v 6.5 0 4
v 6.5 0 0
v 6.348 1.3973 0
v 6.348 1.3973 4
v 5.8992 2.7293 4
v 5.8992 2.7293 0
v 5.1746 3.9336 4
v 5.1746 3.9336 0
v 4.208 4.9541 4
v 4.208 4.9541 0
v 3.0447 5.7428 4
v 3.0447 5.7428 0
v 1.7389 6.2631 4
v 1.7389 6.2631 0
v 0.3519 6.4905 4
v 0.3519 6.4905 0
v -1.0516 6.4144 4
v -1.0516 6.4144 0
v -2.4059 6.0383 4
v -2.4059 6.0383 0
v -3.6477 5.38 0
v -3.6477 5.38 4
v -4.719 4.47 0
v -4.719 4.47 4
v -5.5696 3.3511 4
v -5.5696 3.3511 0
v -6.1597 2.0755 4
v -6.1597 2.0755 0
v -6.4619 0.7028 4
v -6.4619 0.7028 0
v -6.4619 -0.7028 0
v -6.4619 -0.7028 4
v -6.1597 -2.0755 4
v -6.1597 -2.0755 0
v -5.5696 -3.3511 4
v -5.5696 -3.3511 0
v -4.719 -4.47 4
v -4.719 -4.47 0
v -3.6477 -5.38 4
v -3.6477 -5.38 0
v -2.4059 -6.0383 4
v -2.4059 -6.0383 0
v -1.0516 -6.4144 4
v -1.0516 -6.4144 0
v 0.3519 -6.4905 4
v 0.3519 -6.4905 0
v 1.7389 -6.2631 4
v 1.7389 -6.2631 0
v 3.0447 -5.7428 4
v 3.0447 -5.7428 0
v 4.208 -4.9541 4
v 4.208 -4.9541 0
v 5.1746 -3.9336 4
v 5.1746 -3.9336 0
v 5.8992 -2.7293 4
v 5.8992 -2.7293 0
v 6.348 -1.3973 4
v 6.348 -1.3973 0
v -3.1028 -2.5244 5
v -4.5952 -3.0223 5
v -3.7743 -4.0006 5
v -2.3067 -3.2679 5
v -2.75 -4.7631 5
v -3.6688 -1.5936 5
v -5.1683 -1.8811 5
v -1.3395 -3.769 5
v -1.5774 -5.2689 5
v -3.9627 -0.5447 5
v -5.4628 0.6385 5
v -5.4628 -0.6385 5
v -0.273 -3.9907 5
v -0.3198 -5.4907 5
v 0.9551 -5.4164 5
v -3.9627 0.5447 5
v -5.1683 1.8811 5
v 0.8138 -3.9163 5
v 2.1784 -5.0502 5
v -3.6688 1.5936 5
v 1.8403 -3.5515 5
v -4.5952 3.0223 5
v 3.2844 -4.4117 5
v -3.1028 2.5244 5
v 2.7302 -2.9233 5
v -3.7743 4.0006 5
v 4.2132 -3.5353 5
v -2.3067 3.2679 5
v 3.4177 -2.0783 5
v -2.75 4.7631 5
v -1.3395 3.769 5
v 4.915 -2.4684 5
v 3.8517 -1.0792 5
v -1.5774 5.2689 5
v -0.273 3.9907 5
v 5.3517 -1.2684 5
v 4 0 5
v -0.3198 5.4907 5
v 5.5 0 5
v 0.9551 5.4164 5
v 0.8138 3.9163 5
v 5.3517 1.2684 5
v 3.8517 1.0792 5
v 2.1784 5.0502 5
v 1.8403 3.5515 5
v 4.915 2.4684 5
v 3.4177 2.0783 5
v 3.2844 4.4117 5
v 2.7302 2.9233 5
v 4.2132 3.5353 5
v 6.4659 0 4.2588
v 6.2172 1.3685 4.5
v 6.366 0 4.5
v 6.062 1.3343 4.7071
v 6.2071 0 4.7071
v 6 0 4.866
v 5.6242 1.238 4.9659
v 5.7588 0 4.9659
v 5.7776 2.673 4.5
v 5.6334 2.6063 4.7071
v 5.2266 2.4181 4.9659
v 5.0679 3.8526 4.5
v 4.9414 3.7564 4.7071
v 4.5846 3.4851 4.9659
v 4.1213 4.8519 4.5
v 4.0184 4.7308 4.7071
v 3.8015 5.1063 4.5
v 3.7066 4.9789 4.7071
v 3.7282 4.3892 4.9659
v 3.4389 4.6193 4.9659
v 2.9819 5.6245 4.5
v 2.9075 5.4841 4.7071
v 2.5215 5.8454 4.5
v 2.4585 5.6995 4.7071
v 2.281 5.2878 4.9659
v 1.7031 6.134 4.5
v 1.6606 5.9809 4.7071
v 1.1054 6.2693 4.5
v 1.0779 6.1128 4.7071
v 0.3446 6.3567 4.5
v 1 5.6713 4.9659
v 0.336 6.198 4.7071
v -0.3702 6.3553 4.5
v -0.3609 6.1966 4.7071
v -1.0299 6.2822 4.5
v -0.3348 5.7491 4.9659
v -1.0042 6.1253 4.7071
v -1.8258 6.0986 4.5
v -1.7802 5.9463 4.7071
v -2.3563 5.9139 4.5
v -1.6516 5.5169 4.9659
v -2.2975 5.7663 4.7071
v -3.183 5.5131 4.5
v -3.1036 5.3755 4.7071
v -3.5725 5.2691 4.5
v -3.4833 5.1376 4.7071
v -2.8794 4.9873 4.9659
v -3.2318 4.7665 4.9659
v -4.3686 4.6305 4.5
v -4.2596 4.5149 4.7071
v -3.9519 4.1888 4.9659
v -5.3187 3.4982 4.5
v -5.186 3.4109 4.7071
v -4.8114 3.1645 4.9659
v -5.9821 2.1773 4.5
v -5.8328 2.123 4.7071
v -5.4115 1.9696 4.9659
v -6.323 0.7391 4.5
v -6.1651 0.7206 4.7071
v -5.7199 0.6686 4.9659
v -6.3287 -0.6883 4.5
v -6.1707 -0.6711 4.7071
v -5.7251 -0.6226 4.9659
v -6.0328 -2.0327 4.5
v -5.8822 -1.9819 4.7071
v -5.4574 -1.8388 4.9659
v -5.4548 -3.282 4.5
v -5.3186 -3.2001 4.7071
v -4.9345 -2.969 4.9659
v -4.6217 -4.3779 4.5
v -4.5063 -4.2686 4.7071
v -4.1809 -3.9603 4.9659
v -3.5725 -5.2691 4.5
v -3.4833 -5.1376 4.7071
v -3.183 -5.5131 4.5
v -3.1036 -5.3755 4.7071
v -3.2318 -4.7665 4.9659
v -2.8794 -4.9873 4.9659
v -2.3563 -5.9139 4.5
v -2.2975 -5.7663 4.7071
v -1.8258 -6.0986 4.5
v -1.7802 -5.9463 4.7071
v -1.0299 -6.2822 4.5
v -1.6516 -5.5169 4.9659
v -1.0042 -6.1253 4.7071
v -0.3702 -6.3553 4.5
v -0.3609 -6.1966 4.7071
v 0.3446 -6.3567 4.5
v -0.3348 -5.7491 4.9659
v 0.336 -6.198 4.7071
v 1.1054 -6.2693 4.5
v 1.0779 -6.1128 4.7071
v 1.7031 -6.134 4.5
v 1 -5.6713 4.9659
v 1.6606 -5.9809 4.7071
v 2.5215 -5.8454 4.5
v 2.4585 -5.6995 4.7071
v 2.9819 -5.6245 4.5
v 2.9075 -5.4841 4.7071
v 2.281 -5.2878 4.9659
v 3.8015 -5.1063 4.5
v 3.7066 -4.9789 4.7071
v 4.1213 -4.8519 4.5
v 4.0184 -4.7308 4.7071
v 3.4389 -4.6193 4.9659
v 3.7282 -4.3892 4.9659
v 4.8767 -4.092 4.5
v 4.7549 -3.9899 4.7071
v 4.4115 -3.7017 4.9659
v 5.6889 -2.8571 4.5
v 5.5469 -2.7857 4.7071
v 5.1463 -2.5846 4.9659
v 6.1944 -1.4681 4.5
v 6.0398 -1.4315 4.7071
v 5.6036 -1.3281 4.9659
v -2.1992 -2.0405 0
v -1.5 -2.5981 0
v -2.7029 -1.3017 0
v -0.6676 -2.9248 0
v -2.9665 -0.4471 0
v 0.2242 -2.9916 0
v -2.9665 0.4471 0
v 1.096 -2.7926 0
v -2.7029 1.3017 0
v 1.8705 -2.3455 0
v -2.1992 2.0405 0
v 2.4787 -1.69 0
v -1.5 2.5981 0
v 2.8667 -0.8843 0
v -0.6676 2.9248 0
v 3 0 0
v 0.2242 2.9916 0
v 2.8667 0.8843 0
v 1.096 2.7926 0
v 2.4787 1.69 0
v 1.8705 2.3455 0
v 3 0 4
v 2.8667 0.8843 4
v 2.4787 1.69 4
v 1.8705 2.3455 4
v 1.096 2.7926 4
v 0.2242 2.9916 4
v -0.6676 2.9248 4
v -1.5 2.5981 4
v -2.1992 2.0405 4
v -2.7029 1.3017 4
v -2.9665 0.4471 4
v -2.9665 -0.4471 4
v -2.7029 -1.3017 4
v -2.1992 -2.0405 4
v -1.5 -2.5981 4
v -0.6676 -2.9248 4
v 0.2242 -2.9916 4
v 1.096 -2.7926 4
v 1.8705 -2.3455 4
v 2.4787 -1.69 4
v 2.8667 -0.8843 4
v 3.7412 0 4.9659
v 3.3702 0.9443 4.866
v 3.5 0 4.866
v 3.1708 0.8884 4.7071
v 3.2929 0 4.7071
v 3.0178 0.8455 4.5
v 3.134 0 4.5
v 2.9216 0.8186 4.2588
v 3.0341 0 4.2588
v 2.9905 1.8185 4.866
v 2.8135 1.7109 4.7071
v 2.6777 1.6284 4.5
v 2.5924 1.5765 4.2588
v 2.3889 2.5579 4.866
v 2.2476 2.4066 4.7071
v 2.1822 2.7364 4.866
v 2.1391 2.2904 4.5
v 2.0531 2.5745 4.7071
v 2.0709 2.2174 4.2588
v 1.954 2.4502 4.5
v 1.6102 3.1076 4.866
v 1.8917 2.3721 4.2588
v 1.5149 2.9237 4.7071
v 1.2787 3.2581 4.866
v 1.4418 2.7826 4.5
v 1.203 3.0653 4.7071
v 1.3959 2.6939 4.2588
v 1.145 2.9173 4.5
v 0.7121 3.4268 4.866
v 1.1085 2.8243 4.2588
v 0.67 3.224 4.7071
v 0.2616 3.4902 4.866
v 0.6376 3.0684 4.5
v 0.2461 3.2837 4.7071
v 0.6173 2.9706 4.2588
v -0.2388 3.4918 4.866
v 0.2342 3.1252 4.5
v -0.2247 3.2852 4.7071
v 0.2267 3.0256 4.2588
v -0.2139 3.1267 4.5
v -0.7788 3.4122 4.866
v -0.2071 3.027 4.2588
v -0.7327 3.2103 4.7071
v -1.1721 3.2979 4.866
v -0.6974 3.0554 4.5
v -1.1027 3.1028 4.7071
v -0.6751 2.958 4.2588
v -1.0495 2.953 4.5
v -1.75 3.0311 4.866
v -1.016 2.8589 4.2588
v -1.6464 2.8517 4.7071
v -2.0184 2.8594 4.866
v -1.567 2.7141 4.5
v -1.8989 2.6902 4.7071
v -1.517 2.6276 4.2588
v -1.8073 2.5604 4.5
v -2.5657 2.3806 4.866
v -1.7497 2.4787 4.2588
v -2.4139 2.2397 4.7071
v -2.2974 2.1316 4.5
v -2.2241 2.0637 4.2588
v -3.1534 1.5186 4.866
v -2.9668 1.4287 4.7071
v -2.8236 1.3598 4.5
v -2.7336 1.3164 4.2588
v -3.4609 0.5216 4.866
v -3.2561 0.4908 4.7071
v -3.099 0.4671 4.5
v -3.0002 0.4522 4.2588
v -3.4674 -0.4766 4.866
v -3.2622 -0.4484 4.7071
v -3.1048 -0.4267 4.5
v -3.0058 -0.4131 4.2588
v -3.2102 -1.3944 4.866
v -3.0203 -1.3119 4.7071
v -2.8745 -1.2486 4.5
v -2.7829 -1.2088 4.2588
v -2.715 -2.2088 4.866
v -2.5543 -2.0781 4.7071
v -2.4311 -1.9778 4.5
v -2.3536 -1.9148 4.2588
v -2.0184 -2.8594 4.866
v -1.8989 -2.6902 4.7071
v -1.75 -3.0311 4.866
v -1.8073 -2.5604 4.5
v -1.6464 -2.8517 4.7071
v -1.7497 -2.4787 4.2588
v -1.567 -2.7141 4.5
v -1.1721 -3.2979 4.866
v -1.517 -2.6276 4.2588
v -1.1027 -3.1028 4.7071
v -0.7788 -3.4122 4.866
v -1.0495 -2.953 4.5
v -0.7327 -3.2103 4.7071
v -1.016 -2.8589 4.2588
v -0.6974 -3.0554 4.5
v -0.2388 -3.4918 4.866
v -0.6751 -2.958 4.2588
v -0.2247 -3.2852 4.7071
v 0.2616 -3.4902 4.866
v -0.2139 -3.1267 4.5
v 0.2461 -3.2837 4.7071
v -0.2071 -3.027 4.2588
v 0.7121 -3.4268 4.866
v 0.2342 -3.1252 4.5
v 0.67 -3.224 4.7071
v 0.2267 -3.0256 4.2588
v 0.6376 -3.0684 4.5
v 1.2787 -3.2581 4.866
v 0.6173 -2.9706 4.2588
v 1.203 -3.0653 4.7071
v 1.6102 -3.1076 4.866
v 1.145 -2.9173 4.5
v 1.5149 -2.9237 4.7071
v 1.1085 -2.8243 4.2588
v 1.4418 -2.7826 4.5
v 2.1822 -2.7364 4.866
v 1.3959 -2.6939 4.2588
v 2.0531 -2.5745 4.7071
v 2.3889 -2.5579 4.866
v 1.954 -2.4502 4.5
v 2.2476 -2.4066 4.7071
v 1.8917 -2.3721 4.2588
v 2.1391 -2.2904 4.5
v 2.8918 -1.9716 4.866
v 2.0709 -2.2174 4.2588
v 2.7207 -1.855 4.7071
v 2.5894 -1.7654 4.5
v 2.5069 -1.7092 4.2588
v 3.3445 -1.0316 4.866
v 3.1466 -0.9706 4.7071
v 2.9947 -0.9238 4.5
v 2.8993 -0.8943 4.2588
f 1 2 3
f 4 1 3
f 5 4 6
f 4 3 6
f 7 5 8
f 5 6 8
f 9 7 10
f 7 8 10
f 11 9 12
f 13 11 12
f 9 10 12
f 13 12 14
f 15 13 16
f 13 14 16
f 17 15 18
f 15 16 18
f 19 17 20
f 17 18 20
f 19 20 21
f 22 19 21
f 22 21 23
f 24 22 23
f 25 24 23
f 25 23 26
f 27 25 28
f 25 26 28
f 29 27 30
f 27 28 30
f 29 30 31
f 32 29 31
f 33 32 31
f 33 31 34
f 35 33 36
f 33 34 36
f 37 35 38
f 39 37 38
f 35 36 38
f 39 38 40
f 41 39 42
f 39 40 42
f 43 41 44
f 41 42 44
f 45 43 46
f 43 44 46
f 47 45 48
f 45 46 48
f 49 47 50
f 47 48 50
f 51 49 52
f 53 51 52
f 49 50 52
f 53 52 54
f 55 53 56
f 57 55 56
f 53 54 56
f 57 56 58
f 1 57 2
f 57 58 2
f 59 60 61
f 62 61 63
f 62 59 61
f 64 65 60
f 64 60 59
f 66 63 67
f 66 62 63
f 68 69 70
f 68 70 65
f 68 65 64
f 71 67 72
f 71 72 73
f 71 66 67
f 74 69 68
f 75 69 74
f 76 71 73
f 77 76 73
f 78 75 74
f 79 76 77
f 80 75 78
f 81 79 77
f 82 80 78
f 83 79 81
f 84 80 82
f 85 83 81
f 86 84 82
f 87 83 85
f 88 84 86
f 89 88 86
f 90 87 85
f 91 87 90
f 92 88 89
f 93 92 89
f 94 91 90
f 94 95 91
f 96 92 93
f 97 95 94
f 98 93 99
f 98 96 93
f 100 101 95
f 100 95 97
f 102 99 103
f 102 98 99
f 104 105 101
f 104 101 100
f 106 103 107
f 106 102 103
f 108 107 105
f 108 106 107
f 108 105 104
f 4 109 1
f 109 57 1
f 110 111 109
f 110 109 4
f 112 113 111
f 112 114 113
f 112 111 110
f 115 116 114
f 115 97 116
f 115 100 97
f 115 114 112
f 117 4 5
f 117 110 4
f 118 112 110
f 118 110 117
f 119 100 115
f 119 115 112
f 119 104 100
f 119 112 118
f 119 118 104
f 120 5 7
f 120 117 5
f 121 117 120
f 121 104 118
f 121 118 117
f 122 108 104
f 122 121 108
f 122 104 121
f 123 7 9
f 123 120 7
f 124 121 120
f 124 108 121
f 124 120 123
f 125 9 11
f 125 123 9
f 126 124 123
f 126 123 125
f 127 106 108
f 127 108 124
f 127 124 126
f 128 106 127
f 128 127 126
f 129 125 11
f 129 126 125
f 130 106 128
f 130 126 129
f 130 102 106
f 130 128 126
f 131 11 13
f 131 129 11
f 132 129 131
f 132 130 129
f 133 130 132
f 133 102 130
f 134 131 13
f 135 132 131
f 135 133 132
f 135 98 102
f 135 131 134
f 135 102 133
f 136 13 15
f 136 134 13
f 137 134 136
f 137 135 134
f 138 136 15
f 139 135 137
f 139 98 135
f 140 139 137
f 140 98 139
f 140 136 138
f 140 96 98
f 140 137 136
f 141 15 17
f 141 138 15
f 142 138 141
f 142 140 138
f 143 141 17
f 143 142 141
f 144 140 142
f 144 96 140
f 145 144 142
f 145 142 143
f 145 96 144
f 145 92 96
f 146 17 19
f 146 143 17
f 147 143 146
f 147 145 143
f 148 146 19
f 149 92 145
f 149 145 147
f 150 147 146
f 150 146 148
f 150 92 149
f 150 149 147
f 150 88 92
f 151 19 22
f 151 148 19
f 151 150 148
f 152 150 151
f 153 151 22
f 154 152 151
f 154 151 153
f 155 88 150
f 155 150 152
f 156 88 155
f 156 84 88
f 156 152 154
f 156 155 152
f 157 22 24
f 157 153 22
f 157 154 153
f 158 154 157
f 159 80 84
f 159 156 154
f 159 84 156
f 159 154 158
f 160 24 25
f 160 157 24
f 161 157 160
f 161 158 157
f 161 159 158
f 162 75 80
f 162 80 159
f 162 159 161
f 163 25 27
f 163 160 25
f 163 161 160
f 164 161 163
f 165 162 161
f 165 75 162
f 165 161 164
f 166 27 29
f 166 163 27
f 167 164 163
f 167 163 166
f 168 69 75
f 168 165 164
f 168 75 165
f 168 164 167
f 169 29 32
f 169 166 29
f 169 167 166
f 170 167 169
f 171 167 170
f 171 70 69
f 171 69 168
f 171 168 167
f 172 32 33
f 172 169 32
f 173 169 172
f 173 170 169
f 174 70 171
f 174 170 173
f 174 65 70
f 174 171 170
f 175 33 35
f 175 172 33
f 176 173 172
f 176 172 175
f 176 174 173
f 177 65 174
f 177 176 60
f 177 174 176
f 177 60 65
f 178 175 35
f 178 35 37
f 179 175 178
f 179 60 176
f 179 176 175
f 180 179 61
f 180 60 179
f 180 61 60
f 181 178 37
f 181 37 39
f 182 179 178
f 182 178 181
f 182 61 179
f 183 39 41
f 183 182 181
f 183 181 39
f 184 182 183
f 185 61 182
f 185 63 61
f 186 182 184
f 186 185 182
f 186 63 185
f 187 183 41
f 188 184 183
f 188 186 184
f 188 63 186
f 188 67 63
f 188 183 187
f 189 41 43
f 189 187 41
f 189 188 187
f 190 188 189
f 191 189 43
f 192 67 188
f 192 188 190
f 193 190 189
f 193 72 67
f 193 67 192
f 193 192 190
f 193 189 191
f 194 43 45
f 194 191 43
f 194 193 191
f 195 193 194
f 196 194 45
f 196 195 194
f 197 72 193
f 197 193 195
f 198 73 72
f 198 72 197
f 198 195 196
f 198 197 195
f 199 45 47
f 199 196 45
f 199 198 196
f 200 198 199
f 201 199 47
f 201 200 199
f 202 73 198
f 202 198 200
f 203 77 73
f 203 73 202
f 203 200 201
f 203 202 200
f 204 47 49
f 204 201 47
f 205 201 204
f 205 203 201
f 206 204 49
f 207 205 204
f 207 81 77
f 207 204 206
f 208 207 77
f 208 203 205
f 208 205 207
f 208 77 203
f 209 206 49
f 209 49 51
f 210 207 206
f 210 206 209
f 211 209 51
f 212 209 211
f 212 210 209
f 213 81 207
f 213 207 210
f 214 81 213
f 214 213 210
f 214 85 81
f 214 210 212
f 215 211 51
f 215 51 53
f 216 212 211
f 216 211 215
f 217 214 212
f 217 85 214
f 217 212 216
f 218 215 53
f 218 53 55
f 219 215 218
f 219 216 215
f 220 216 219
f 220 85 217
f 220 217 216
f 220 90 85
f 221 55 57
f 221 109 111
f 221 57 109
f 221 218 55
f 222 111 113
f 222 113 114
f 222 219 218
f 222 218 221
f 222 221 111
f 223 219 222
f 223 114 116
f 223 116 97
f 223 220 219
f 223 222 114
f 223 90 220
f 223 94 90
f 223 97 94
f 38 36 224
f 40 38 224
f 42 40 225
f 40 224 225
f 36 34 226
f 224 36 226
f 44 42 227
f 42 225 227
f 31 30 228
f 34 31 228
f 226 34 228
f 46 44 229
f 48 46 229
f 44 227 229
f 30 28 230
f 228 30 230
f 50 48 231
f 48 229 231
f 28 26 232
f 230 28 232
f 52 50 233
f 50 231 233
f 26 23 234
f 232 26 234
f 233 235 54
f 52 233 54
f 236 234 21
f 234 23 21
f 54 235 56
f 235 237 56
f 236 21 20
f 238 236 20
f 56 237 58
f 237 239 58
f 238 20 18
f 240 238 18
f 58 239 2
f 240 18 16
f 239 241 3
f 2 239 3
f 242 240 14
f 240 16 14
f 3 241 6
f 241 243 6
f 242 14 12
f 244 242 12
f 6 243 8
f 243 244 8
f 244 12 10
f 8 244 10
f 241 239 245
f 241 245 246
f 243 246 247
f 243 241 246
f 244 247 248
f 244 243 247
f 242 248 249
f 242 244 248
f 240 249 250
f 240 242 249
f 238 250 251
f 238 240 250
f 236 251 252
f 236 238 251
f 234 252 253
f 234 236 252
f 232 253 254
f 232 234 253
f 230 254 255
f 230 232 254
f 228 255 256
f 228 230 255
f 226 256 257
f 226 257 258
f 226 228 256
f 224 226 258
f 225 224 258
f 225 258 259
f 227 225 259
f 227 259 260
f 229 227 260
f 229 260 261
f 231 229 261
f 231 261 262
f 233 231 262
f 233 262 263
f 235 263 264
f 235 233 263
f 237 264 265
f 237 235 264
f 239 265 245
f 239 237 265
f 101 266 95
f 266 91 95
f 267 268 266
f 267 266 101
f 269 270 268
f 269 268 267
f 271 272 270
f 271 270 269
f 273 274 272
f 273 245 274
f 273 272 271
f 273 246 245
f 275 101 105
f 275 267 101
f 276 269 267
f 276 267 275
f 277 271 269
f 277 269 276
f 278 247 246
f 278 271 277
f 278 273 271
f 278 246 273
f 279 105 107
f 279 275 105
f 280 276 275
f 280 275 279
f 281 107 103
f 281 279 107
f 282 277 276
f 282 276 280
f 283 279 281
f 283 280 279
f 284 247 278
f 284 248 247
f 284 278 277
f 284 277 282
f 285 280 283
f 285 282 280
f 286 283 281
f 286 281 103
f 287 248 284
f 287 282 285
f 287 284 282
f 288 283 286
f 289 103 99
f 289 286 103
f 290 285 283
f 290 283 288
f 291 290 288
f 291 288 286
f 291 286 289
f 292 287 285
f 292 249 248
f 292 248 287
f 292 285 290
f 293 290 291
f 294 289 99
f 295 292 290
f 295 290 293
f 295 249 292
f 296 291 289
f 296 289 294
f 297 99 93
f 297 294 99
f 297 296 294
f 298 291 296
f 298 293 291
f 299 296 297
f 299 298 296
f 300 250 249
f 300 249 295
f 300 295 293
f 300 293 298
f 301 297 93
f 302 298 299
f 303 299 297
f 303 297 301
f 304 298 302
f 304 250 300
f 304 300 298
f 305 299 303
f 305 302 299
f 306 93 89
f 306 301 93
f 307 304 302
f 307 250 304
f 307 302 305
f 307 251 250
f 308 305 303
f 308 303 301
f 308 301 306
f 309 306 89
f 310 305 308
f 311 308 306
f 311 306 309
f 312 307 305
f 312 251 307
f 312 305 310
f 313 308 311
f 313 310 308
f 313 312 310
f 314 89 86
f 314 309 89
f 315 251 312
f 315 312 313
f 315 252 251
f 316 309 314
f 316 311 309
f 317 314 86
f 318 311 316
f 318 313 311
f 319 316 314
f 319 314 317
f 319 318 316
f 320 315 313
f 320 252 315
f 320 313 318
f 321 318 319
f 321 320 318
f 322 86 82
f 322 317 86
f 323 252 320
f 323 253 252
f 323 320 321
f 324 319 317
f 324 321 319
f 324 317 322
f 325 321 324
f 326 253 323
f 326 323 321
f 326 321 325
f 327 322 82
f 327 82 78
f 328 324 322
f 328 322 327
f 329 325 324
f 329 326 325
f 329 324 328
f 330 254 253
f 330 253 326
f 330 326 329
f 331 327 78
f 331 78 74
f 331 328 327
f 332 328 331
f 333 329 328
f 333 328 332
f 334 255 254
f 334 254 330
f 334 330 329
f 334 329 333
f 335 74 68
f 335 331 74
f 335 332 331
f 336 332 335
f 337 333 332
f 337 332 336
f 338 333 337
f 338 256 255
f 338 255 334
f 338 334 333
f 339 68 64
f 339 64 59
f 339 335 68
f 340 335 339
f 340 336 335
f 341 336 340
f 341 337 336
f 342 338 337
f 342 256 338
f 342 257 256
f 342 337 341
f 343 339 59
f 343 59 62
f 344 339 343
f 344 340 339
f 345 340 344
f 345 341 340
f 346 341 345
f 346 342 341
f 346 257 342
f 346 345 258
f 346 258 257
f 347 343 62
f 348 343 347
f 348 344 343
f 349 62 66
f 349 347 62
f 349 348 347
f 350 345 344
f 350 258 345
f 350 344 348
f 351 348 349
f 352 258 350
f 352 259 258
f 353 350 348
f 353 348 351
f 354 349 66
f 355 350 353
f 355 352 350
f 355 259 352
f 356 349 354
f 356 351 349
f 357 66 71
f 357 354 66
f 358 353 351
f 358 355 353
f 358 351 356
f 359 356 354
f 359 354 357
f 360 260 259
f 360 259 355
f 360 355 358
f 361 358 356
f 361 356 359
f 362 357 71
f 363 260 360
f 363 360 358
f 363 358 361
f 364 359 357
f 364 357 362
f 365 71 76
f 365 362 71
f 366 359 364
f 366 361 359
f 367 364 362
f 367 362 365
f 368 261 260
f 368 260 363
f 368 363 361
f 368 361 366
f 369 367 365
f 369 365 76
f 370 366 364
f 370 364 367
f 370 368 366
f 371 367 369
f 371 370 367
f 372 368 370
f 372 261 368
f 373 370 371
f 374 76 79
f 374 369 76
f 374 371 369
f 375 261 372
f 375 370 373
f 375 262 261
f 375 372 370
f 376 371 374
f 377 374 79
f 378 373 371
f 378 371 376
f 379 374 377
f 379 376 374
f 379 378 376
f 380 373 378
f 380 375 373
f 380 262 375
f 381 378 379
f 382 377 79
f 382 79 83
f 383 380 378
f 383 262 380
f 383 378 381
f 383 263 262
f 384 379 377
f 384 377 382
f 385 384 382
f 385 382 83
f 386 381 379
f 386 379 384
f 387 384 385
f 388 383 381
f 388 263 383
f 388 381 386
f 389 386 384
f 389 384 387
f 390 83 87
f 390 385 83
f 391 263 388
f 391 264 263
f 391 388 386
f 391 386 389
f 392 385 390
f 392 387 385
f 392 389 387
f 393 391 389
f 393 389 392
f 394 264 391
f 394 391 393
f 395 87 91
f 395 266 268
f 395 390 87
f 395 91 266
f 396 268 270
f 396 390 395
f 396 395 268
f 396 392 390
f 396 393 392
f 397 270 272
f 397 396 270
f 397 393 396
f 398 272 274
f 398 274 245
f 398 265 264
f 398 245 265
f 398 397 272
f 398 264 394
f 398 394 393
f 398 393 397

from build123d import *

# Parameters (mm, degrees)
F0_R     = 6.5
F0_R_2   = 3
F1_DEPTH = 5
F2_DEPTH = 5
F3_R     = 1


with BuildPart() as f1:
    # F0 (on Top) → F1 (new body)
    with BuildSketch(Plane.XY):
        Circle(F0_R)
        Circle(F0_R_2, mode=Mode.SUBTRACT)
    extrude(amount=F1_DEPTH)

    # F0 (on Top) → F2 (join)
    with BuildSketch(Plane.XY):
        Circle(F0_R)
        Circle(F0_R_2, mode=Mode.SUBTRACT)
    extrude(amount=F2_DEPTH)

    # F3
    f3_edges = [f1.edges().sort_by_distance(p)[0] for p in [
        (-3, 0, 5),
        (-6.5, 0, 5),
    ]]
    fillet(f3_edges, radius=F3_R)


solid = f1.part
